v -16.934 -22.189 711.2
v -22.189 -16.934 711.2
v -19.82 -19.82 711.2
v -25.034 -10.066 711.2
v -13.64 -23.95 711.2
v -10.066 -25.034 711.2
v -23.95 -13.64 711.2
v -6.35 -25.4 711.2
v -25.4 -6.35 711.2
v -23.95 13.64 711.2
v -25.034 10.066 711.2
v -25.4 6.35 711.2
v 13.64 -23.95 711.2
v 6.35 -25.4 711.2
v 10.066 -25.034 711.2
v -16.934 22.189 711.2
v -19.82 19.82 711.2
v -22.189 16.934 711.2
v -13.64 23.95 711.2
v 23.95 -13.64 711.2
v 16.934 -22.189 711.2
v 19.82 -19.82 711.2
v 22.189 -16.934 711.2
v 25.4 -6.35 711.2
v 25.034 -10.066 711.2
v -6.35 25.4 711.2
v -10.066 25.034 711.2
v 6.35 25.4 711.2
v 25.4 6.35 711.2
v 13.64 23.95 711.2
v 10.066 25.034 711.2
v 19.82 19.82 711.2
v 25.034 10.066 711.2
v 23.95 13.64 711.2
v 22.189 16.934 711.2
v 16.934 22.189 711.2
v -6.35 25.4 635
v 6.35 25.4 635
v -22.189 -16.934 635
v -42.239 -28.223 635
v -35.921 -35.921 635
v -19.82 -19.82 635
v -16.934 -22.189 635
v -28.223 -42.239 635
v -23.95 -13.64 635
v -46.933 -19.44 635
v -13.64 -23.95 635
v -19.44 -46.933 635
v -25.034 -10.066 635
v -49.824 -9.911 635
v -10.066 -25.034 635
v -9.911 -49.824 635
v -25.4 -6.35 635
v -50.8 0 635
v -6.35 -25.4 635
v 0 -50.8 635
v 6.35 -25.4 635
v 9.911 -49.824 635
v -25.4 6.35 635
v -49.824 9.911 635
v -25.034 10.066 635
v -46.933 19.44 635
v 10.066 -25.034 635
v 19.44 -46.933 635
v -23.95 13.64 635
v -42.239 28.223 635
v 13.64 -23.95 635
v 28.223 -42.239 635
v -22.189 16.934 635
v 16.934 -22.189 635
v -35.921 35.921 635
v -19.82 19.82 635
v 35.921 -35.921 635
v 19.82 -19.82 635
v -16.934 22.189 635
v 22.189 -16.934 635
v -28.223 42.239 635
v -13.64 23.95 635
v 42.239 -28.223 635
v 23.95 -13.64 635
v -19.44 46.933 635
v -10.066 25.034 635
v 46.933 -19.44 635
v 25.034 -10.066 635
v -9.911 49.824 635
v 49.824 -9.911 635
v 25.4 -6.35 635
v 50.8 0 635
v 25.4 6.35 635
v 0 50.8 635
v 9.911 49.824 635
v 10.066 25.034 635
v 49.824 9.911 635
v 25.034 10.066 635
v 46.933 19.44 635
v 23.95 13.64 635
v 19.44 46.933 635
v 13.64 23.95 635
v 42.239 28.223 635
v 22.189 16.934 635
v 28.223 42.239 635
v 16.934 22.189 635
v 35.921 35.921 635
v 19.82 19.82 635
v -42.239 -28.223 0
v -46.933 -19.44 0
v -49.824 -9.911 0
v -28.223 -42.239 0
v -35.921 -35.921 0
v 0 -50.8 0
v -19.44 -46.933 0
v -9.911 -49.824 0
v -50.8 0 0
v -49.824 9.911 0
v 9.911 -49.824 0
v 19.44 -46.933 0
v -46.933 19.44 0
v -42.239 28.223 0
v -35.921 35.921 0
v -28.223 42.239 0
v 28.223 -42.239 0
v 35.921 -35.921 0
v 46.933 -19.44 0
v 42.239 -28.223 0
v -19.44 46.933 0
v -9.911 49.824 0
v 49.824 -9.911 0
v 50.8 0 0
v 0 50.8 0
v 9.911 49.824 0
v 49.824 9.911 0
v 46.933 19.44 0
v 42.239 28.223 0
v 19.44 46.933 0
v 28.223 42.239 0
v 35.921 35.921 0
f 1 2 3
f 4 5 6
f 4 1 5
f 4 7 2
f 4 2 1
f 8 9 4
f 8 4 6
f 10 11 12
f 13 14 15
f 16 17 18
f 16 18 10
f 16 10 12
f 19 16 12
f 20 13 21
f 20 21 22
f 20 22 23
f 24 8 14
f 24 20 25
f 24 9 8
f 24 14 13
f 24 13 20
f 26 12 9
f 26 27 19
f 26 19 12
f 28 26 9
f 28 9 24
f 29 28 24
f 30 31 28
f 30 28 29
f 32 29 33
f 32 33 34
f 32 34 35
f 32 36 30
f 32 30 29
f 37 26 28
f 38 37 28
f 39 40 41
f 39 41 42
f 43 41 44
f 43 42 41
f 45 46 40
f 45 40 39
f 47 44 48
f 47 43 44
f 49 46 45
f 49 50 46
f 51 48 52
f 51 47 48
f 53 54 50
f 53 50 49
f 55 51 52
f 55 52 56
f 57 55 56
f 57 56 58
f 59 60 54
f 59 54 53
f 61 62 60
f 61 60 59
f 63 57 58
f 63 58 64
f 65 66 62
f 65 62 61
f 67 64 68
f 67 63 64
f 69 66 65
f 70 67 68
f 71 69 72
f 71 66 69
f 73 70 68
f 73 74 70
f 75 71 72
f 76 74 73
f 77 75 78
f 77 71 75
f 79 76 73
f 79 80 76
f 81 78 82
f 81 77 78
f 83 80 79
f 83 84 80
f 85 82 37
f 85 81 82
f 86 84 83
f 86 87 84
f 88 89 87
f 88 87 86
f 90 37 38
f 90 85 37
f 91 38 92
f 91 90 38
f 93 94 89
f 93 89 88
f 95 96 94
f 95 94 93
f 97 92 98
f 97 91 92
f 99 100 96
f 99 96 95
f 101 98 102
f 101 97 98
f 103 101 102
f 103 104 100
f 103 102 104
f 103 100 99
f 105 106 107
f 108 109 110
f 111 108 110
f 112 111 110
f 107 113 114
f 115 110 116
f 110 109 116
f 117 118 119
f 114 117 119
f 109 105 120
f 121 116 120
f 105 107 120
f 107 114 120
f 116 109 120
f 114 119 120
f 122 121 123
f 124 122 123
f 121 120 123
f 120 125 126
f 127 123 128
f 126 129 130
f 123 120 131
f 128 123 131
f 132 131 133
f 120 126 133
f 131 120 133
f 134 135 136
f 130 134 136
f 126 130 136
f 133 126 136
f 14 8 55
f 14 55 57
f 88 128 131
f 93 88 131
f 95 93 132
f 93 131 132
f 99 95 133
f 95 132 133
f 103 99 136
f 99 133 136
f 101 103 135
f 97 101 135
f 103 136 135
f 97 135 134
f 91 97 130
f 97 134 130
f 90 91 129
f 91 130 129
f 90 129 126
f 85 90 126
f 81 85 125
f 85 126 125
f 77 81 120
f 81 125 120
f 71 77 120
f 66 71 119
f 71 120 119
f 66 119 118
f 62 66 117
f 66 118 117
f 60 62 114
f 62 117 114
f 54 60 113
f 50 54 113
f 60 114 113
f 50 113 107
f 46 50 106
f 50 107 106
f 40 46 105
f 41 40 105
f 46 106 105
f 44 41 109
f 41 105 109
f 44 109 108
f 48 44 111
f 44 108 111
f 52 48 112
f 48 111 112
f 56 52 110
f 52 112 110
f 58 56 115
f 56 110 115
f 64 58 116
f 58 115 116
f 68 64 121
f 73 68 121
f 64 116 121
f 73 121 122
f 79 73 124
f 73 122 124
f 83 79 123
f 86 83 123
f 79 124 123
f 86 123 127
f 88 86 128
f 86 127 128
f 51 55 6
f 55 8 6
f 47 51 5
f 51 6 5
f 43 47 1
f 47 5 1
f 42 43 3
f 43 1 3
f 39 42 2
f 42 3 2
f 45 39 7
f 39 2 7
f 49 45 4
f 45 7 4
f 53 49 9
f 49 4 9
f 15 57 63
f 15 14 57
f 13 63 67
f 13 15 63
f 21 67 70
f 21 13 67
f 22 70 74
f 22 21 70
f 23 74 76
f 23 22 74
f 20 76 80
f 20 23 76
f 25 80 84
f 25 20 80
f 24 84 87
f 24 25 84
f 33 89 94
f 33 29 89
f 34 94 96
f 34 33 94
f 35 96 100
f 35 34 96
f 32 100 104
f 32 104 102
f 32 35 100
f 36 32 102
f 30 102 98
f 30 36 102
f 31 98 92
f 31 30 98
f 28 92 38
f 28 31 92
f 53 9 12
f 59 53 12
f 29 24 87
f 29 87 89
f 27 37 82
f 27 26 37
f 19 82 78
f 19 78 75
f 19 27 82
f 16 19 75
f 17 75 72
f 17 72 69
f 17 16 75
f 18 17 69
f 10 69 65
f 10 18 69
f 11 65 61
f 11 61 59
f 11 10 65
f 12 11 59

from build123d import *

# Parameters (mm, degrees)
F0_R     = 50.8
F1_DEPTH = 635
F2_W     = 50.8
F2_H     = 50.8
F3_DEPTH = 76.2
F4_R     = 19.05


with BuildPart() as f1:
    # F0 (on Top) → F1 (new body)
    with BuildSketch(Plane.XY):
        Circle(F0_R)
    extrude(amount=F1_DEPTH)

    # F2 (on face) → F3 (join)
    with BuildSketch(Plane.XY.offset(635)):
        Rectangle(F2_W, F2_H)
    extrude(amount=F3_DEPTH)

    # F4
    f4_edges = [f1.edges().sort_by_distance(p)[0] for p in [
        (25.4, -25.4, 673.1),
        (-25.4, -25.4, 673.1),
        (25.4, 25.4, 673.1),
        (-25.4, 25.4, 673.1),
    ]]
    fillet(f4_edges, radius=F4_R)


solid = f1.part
